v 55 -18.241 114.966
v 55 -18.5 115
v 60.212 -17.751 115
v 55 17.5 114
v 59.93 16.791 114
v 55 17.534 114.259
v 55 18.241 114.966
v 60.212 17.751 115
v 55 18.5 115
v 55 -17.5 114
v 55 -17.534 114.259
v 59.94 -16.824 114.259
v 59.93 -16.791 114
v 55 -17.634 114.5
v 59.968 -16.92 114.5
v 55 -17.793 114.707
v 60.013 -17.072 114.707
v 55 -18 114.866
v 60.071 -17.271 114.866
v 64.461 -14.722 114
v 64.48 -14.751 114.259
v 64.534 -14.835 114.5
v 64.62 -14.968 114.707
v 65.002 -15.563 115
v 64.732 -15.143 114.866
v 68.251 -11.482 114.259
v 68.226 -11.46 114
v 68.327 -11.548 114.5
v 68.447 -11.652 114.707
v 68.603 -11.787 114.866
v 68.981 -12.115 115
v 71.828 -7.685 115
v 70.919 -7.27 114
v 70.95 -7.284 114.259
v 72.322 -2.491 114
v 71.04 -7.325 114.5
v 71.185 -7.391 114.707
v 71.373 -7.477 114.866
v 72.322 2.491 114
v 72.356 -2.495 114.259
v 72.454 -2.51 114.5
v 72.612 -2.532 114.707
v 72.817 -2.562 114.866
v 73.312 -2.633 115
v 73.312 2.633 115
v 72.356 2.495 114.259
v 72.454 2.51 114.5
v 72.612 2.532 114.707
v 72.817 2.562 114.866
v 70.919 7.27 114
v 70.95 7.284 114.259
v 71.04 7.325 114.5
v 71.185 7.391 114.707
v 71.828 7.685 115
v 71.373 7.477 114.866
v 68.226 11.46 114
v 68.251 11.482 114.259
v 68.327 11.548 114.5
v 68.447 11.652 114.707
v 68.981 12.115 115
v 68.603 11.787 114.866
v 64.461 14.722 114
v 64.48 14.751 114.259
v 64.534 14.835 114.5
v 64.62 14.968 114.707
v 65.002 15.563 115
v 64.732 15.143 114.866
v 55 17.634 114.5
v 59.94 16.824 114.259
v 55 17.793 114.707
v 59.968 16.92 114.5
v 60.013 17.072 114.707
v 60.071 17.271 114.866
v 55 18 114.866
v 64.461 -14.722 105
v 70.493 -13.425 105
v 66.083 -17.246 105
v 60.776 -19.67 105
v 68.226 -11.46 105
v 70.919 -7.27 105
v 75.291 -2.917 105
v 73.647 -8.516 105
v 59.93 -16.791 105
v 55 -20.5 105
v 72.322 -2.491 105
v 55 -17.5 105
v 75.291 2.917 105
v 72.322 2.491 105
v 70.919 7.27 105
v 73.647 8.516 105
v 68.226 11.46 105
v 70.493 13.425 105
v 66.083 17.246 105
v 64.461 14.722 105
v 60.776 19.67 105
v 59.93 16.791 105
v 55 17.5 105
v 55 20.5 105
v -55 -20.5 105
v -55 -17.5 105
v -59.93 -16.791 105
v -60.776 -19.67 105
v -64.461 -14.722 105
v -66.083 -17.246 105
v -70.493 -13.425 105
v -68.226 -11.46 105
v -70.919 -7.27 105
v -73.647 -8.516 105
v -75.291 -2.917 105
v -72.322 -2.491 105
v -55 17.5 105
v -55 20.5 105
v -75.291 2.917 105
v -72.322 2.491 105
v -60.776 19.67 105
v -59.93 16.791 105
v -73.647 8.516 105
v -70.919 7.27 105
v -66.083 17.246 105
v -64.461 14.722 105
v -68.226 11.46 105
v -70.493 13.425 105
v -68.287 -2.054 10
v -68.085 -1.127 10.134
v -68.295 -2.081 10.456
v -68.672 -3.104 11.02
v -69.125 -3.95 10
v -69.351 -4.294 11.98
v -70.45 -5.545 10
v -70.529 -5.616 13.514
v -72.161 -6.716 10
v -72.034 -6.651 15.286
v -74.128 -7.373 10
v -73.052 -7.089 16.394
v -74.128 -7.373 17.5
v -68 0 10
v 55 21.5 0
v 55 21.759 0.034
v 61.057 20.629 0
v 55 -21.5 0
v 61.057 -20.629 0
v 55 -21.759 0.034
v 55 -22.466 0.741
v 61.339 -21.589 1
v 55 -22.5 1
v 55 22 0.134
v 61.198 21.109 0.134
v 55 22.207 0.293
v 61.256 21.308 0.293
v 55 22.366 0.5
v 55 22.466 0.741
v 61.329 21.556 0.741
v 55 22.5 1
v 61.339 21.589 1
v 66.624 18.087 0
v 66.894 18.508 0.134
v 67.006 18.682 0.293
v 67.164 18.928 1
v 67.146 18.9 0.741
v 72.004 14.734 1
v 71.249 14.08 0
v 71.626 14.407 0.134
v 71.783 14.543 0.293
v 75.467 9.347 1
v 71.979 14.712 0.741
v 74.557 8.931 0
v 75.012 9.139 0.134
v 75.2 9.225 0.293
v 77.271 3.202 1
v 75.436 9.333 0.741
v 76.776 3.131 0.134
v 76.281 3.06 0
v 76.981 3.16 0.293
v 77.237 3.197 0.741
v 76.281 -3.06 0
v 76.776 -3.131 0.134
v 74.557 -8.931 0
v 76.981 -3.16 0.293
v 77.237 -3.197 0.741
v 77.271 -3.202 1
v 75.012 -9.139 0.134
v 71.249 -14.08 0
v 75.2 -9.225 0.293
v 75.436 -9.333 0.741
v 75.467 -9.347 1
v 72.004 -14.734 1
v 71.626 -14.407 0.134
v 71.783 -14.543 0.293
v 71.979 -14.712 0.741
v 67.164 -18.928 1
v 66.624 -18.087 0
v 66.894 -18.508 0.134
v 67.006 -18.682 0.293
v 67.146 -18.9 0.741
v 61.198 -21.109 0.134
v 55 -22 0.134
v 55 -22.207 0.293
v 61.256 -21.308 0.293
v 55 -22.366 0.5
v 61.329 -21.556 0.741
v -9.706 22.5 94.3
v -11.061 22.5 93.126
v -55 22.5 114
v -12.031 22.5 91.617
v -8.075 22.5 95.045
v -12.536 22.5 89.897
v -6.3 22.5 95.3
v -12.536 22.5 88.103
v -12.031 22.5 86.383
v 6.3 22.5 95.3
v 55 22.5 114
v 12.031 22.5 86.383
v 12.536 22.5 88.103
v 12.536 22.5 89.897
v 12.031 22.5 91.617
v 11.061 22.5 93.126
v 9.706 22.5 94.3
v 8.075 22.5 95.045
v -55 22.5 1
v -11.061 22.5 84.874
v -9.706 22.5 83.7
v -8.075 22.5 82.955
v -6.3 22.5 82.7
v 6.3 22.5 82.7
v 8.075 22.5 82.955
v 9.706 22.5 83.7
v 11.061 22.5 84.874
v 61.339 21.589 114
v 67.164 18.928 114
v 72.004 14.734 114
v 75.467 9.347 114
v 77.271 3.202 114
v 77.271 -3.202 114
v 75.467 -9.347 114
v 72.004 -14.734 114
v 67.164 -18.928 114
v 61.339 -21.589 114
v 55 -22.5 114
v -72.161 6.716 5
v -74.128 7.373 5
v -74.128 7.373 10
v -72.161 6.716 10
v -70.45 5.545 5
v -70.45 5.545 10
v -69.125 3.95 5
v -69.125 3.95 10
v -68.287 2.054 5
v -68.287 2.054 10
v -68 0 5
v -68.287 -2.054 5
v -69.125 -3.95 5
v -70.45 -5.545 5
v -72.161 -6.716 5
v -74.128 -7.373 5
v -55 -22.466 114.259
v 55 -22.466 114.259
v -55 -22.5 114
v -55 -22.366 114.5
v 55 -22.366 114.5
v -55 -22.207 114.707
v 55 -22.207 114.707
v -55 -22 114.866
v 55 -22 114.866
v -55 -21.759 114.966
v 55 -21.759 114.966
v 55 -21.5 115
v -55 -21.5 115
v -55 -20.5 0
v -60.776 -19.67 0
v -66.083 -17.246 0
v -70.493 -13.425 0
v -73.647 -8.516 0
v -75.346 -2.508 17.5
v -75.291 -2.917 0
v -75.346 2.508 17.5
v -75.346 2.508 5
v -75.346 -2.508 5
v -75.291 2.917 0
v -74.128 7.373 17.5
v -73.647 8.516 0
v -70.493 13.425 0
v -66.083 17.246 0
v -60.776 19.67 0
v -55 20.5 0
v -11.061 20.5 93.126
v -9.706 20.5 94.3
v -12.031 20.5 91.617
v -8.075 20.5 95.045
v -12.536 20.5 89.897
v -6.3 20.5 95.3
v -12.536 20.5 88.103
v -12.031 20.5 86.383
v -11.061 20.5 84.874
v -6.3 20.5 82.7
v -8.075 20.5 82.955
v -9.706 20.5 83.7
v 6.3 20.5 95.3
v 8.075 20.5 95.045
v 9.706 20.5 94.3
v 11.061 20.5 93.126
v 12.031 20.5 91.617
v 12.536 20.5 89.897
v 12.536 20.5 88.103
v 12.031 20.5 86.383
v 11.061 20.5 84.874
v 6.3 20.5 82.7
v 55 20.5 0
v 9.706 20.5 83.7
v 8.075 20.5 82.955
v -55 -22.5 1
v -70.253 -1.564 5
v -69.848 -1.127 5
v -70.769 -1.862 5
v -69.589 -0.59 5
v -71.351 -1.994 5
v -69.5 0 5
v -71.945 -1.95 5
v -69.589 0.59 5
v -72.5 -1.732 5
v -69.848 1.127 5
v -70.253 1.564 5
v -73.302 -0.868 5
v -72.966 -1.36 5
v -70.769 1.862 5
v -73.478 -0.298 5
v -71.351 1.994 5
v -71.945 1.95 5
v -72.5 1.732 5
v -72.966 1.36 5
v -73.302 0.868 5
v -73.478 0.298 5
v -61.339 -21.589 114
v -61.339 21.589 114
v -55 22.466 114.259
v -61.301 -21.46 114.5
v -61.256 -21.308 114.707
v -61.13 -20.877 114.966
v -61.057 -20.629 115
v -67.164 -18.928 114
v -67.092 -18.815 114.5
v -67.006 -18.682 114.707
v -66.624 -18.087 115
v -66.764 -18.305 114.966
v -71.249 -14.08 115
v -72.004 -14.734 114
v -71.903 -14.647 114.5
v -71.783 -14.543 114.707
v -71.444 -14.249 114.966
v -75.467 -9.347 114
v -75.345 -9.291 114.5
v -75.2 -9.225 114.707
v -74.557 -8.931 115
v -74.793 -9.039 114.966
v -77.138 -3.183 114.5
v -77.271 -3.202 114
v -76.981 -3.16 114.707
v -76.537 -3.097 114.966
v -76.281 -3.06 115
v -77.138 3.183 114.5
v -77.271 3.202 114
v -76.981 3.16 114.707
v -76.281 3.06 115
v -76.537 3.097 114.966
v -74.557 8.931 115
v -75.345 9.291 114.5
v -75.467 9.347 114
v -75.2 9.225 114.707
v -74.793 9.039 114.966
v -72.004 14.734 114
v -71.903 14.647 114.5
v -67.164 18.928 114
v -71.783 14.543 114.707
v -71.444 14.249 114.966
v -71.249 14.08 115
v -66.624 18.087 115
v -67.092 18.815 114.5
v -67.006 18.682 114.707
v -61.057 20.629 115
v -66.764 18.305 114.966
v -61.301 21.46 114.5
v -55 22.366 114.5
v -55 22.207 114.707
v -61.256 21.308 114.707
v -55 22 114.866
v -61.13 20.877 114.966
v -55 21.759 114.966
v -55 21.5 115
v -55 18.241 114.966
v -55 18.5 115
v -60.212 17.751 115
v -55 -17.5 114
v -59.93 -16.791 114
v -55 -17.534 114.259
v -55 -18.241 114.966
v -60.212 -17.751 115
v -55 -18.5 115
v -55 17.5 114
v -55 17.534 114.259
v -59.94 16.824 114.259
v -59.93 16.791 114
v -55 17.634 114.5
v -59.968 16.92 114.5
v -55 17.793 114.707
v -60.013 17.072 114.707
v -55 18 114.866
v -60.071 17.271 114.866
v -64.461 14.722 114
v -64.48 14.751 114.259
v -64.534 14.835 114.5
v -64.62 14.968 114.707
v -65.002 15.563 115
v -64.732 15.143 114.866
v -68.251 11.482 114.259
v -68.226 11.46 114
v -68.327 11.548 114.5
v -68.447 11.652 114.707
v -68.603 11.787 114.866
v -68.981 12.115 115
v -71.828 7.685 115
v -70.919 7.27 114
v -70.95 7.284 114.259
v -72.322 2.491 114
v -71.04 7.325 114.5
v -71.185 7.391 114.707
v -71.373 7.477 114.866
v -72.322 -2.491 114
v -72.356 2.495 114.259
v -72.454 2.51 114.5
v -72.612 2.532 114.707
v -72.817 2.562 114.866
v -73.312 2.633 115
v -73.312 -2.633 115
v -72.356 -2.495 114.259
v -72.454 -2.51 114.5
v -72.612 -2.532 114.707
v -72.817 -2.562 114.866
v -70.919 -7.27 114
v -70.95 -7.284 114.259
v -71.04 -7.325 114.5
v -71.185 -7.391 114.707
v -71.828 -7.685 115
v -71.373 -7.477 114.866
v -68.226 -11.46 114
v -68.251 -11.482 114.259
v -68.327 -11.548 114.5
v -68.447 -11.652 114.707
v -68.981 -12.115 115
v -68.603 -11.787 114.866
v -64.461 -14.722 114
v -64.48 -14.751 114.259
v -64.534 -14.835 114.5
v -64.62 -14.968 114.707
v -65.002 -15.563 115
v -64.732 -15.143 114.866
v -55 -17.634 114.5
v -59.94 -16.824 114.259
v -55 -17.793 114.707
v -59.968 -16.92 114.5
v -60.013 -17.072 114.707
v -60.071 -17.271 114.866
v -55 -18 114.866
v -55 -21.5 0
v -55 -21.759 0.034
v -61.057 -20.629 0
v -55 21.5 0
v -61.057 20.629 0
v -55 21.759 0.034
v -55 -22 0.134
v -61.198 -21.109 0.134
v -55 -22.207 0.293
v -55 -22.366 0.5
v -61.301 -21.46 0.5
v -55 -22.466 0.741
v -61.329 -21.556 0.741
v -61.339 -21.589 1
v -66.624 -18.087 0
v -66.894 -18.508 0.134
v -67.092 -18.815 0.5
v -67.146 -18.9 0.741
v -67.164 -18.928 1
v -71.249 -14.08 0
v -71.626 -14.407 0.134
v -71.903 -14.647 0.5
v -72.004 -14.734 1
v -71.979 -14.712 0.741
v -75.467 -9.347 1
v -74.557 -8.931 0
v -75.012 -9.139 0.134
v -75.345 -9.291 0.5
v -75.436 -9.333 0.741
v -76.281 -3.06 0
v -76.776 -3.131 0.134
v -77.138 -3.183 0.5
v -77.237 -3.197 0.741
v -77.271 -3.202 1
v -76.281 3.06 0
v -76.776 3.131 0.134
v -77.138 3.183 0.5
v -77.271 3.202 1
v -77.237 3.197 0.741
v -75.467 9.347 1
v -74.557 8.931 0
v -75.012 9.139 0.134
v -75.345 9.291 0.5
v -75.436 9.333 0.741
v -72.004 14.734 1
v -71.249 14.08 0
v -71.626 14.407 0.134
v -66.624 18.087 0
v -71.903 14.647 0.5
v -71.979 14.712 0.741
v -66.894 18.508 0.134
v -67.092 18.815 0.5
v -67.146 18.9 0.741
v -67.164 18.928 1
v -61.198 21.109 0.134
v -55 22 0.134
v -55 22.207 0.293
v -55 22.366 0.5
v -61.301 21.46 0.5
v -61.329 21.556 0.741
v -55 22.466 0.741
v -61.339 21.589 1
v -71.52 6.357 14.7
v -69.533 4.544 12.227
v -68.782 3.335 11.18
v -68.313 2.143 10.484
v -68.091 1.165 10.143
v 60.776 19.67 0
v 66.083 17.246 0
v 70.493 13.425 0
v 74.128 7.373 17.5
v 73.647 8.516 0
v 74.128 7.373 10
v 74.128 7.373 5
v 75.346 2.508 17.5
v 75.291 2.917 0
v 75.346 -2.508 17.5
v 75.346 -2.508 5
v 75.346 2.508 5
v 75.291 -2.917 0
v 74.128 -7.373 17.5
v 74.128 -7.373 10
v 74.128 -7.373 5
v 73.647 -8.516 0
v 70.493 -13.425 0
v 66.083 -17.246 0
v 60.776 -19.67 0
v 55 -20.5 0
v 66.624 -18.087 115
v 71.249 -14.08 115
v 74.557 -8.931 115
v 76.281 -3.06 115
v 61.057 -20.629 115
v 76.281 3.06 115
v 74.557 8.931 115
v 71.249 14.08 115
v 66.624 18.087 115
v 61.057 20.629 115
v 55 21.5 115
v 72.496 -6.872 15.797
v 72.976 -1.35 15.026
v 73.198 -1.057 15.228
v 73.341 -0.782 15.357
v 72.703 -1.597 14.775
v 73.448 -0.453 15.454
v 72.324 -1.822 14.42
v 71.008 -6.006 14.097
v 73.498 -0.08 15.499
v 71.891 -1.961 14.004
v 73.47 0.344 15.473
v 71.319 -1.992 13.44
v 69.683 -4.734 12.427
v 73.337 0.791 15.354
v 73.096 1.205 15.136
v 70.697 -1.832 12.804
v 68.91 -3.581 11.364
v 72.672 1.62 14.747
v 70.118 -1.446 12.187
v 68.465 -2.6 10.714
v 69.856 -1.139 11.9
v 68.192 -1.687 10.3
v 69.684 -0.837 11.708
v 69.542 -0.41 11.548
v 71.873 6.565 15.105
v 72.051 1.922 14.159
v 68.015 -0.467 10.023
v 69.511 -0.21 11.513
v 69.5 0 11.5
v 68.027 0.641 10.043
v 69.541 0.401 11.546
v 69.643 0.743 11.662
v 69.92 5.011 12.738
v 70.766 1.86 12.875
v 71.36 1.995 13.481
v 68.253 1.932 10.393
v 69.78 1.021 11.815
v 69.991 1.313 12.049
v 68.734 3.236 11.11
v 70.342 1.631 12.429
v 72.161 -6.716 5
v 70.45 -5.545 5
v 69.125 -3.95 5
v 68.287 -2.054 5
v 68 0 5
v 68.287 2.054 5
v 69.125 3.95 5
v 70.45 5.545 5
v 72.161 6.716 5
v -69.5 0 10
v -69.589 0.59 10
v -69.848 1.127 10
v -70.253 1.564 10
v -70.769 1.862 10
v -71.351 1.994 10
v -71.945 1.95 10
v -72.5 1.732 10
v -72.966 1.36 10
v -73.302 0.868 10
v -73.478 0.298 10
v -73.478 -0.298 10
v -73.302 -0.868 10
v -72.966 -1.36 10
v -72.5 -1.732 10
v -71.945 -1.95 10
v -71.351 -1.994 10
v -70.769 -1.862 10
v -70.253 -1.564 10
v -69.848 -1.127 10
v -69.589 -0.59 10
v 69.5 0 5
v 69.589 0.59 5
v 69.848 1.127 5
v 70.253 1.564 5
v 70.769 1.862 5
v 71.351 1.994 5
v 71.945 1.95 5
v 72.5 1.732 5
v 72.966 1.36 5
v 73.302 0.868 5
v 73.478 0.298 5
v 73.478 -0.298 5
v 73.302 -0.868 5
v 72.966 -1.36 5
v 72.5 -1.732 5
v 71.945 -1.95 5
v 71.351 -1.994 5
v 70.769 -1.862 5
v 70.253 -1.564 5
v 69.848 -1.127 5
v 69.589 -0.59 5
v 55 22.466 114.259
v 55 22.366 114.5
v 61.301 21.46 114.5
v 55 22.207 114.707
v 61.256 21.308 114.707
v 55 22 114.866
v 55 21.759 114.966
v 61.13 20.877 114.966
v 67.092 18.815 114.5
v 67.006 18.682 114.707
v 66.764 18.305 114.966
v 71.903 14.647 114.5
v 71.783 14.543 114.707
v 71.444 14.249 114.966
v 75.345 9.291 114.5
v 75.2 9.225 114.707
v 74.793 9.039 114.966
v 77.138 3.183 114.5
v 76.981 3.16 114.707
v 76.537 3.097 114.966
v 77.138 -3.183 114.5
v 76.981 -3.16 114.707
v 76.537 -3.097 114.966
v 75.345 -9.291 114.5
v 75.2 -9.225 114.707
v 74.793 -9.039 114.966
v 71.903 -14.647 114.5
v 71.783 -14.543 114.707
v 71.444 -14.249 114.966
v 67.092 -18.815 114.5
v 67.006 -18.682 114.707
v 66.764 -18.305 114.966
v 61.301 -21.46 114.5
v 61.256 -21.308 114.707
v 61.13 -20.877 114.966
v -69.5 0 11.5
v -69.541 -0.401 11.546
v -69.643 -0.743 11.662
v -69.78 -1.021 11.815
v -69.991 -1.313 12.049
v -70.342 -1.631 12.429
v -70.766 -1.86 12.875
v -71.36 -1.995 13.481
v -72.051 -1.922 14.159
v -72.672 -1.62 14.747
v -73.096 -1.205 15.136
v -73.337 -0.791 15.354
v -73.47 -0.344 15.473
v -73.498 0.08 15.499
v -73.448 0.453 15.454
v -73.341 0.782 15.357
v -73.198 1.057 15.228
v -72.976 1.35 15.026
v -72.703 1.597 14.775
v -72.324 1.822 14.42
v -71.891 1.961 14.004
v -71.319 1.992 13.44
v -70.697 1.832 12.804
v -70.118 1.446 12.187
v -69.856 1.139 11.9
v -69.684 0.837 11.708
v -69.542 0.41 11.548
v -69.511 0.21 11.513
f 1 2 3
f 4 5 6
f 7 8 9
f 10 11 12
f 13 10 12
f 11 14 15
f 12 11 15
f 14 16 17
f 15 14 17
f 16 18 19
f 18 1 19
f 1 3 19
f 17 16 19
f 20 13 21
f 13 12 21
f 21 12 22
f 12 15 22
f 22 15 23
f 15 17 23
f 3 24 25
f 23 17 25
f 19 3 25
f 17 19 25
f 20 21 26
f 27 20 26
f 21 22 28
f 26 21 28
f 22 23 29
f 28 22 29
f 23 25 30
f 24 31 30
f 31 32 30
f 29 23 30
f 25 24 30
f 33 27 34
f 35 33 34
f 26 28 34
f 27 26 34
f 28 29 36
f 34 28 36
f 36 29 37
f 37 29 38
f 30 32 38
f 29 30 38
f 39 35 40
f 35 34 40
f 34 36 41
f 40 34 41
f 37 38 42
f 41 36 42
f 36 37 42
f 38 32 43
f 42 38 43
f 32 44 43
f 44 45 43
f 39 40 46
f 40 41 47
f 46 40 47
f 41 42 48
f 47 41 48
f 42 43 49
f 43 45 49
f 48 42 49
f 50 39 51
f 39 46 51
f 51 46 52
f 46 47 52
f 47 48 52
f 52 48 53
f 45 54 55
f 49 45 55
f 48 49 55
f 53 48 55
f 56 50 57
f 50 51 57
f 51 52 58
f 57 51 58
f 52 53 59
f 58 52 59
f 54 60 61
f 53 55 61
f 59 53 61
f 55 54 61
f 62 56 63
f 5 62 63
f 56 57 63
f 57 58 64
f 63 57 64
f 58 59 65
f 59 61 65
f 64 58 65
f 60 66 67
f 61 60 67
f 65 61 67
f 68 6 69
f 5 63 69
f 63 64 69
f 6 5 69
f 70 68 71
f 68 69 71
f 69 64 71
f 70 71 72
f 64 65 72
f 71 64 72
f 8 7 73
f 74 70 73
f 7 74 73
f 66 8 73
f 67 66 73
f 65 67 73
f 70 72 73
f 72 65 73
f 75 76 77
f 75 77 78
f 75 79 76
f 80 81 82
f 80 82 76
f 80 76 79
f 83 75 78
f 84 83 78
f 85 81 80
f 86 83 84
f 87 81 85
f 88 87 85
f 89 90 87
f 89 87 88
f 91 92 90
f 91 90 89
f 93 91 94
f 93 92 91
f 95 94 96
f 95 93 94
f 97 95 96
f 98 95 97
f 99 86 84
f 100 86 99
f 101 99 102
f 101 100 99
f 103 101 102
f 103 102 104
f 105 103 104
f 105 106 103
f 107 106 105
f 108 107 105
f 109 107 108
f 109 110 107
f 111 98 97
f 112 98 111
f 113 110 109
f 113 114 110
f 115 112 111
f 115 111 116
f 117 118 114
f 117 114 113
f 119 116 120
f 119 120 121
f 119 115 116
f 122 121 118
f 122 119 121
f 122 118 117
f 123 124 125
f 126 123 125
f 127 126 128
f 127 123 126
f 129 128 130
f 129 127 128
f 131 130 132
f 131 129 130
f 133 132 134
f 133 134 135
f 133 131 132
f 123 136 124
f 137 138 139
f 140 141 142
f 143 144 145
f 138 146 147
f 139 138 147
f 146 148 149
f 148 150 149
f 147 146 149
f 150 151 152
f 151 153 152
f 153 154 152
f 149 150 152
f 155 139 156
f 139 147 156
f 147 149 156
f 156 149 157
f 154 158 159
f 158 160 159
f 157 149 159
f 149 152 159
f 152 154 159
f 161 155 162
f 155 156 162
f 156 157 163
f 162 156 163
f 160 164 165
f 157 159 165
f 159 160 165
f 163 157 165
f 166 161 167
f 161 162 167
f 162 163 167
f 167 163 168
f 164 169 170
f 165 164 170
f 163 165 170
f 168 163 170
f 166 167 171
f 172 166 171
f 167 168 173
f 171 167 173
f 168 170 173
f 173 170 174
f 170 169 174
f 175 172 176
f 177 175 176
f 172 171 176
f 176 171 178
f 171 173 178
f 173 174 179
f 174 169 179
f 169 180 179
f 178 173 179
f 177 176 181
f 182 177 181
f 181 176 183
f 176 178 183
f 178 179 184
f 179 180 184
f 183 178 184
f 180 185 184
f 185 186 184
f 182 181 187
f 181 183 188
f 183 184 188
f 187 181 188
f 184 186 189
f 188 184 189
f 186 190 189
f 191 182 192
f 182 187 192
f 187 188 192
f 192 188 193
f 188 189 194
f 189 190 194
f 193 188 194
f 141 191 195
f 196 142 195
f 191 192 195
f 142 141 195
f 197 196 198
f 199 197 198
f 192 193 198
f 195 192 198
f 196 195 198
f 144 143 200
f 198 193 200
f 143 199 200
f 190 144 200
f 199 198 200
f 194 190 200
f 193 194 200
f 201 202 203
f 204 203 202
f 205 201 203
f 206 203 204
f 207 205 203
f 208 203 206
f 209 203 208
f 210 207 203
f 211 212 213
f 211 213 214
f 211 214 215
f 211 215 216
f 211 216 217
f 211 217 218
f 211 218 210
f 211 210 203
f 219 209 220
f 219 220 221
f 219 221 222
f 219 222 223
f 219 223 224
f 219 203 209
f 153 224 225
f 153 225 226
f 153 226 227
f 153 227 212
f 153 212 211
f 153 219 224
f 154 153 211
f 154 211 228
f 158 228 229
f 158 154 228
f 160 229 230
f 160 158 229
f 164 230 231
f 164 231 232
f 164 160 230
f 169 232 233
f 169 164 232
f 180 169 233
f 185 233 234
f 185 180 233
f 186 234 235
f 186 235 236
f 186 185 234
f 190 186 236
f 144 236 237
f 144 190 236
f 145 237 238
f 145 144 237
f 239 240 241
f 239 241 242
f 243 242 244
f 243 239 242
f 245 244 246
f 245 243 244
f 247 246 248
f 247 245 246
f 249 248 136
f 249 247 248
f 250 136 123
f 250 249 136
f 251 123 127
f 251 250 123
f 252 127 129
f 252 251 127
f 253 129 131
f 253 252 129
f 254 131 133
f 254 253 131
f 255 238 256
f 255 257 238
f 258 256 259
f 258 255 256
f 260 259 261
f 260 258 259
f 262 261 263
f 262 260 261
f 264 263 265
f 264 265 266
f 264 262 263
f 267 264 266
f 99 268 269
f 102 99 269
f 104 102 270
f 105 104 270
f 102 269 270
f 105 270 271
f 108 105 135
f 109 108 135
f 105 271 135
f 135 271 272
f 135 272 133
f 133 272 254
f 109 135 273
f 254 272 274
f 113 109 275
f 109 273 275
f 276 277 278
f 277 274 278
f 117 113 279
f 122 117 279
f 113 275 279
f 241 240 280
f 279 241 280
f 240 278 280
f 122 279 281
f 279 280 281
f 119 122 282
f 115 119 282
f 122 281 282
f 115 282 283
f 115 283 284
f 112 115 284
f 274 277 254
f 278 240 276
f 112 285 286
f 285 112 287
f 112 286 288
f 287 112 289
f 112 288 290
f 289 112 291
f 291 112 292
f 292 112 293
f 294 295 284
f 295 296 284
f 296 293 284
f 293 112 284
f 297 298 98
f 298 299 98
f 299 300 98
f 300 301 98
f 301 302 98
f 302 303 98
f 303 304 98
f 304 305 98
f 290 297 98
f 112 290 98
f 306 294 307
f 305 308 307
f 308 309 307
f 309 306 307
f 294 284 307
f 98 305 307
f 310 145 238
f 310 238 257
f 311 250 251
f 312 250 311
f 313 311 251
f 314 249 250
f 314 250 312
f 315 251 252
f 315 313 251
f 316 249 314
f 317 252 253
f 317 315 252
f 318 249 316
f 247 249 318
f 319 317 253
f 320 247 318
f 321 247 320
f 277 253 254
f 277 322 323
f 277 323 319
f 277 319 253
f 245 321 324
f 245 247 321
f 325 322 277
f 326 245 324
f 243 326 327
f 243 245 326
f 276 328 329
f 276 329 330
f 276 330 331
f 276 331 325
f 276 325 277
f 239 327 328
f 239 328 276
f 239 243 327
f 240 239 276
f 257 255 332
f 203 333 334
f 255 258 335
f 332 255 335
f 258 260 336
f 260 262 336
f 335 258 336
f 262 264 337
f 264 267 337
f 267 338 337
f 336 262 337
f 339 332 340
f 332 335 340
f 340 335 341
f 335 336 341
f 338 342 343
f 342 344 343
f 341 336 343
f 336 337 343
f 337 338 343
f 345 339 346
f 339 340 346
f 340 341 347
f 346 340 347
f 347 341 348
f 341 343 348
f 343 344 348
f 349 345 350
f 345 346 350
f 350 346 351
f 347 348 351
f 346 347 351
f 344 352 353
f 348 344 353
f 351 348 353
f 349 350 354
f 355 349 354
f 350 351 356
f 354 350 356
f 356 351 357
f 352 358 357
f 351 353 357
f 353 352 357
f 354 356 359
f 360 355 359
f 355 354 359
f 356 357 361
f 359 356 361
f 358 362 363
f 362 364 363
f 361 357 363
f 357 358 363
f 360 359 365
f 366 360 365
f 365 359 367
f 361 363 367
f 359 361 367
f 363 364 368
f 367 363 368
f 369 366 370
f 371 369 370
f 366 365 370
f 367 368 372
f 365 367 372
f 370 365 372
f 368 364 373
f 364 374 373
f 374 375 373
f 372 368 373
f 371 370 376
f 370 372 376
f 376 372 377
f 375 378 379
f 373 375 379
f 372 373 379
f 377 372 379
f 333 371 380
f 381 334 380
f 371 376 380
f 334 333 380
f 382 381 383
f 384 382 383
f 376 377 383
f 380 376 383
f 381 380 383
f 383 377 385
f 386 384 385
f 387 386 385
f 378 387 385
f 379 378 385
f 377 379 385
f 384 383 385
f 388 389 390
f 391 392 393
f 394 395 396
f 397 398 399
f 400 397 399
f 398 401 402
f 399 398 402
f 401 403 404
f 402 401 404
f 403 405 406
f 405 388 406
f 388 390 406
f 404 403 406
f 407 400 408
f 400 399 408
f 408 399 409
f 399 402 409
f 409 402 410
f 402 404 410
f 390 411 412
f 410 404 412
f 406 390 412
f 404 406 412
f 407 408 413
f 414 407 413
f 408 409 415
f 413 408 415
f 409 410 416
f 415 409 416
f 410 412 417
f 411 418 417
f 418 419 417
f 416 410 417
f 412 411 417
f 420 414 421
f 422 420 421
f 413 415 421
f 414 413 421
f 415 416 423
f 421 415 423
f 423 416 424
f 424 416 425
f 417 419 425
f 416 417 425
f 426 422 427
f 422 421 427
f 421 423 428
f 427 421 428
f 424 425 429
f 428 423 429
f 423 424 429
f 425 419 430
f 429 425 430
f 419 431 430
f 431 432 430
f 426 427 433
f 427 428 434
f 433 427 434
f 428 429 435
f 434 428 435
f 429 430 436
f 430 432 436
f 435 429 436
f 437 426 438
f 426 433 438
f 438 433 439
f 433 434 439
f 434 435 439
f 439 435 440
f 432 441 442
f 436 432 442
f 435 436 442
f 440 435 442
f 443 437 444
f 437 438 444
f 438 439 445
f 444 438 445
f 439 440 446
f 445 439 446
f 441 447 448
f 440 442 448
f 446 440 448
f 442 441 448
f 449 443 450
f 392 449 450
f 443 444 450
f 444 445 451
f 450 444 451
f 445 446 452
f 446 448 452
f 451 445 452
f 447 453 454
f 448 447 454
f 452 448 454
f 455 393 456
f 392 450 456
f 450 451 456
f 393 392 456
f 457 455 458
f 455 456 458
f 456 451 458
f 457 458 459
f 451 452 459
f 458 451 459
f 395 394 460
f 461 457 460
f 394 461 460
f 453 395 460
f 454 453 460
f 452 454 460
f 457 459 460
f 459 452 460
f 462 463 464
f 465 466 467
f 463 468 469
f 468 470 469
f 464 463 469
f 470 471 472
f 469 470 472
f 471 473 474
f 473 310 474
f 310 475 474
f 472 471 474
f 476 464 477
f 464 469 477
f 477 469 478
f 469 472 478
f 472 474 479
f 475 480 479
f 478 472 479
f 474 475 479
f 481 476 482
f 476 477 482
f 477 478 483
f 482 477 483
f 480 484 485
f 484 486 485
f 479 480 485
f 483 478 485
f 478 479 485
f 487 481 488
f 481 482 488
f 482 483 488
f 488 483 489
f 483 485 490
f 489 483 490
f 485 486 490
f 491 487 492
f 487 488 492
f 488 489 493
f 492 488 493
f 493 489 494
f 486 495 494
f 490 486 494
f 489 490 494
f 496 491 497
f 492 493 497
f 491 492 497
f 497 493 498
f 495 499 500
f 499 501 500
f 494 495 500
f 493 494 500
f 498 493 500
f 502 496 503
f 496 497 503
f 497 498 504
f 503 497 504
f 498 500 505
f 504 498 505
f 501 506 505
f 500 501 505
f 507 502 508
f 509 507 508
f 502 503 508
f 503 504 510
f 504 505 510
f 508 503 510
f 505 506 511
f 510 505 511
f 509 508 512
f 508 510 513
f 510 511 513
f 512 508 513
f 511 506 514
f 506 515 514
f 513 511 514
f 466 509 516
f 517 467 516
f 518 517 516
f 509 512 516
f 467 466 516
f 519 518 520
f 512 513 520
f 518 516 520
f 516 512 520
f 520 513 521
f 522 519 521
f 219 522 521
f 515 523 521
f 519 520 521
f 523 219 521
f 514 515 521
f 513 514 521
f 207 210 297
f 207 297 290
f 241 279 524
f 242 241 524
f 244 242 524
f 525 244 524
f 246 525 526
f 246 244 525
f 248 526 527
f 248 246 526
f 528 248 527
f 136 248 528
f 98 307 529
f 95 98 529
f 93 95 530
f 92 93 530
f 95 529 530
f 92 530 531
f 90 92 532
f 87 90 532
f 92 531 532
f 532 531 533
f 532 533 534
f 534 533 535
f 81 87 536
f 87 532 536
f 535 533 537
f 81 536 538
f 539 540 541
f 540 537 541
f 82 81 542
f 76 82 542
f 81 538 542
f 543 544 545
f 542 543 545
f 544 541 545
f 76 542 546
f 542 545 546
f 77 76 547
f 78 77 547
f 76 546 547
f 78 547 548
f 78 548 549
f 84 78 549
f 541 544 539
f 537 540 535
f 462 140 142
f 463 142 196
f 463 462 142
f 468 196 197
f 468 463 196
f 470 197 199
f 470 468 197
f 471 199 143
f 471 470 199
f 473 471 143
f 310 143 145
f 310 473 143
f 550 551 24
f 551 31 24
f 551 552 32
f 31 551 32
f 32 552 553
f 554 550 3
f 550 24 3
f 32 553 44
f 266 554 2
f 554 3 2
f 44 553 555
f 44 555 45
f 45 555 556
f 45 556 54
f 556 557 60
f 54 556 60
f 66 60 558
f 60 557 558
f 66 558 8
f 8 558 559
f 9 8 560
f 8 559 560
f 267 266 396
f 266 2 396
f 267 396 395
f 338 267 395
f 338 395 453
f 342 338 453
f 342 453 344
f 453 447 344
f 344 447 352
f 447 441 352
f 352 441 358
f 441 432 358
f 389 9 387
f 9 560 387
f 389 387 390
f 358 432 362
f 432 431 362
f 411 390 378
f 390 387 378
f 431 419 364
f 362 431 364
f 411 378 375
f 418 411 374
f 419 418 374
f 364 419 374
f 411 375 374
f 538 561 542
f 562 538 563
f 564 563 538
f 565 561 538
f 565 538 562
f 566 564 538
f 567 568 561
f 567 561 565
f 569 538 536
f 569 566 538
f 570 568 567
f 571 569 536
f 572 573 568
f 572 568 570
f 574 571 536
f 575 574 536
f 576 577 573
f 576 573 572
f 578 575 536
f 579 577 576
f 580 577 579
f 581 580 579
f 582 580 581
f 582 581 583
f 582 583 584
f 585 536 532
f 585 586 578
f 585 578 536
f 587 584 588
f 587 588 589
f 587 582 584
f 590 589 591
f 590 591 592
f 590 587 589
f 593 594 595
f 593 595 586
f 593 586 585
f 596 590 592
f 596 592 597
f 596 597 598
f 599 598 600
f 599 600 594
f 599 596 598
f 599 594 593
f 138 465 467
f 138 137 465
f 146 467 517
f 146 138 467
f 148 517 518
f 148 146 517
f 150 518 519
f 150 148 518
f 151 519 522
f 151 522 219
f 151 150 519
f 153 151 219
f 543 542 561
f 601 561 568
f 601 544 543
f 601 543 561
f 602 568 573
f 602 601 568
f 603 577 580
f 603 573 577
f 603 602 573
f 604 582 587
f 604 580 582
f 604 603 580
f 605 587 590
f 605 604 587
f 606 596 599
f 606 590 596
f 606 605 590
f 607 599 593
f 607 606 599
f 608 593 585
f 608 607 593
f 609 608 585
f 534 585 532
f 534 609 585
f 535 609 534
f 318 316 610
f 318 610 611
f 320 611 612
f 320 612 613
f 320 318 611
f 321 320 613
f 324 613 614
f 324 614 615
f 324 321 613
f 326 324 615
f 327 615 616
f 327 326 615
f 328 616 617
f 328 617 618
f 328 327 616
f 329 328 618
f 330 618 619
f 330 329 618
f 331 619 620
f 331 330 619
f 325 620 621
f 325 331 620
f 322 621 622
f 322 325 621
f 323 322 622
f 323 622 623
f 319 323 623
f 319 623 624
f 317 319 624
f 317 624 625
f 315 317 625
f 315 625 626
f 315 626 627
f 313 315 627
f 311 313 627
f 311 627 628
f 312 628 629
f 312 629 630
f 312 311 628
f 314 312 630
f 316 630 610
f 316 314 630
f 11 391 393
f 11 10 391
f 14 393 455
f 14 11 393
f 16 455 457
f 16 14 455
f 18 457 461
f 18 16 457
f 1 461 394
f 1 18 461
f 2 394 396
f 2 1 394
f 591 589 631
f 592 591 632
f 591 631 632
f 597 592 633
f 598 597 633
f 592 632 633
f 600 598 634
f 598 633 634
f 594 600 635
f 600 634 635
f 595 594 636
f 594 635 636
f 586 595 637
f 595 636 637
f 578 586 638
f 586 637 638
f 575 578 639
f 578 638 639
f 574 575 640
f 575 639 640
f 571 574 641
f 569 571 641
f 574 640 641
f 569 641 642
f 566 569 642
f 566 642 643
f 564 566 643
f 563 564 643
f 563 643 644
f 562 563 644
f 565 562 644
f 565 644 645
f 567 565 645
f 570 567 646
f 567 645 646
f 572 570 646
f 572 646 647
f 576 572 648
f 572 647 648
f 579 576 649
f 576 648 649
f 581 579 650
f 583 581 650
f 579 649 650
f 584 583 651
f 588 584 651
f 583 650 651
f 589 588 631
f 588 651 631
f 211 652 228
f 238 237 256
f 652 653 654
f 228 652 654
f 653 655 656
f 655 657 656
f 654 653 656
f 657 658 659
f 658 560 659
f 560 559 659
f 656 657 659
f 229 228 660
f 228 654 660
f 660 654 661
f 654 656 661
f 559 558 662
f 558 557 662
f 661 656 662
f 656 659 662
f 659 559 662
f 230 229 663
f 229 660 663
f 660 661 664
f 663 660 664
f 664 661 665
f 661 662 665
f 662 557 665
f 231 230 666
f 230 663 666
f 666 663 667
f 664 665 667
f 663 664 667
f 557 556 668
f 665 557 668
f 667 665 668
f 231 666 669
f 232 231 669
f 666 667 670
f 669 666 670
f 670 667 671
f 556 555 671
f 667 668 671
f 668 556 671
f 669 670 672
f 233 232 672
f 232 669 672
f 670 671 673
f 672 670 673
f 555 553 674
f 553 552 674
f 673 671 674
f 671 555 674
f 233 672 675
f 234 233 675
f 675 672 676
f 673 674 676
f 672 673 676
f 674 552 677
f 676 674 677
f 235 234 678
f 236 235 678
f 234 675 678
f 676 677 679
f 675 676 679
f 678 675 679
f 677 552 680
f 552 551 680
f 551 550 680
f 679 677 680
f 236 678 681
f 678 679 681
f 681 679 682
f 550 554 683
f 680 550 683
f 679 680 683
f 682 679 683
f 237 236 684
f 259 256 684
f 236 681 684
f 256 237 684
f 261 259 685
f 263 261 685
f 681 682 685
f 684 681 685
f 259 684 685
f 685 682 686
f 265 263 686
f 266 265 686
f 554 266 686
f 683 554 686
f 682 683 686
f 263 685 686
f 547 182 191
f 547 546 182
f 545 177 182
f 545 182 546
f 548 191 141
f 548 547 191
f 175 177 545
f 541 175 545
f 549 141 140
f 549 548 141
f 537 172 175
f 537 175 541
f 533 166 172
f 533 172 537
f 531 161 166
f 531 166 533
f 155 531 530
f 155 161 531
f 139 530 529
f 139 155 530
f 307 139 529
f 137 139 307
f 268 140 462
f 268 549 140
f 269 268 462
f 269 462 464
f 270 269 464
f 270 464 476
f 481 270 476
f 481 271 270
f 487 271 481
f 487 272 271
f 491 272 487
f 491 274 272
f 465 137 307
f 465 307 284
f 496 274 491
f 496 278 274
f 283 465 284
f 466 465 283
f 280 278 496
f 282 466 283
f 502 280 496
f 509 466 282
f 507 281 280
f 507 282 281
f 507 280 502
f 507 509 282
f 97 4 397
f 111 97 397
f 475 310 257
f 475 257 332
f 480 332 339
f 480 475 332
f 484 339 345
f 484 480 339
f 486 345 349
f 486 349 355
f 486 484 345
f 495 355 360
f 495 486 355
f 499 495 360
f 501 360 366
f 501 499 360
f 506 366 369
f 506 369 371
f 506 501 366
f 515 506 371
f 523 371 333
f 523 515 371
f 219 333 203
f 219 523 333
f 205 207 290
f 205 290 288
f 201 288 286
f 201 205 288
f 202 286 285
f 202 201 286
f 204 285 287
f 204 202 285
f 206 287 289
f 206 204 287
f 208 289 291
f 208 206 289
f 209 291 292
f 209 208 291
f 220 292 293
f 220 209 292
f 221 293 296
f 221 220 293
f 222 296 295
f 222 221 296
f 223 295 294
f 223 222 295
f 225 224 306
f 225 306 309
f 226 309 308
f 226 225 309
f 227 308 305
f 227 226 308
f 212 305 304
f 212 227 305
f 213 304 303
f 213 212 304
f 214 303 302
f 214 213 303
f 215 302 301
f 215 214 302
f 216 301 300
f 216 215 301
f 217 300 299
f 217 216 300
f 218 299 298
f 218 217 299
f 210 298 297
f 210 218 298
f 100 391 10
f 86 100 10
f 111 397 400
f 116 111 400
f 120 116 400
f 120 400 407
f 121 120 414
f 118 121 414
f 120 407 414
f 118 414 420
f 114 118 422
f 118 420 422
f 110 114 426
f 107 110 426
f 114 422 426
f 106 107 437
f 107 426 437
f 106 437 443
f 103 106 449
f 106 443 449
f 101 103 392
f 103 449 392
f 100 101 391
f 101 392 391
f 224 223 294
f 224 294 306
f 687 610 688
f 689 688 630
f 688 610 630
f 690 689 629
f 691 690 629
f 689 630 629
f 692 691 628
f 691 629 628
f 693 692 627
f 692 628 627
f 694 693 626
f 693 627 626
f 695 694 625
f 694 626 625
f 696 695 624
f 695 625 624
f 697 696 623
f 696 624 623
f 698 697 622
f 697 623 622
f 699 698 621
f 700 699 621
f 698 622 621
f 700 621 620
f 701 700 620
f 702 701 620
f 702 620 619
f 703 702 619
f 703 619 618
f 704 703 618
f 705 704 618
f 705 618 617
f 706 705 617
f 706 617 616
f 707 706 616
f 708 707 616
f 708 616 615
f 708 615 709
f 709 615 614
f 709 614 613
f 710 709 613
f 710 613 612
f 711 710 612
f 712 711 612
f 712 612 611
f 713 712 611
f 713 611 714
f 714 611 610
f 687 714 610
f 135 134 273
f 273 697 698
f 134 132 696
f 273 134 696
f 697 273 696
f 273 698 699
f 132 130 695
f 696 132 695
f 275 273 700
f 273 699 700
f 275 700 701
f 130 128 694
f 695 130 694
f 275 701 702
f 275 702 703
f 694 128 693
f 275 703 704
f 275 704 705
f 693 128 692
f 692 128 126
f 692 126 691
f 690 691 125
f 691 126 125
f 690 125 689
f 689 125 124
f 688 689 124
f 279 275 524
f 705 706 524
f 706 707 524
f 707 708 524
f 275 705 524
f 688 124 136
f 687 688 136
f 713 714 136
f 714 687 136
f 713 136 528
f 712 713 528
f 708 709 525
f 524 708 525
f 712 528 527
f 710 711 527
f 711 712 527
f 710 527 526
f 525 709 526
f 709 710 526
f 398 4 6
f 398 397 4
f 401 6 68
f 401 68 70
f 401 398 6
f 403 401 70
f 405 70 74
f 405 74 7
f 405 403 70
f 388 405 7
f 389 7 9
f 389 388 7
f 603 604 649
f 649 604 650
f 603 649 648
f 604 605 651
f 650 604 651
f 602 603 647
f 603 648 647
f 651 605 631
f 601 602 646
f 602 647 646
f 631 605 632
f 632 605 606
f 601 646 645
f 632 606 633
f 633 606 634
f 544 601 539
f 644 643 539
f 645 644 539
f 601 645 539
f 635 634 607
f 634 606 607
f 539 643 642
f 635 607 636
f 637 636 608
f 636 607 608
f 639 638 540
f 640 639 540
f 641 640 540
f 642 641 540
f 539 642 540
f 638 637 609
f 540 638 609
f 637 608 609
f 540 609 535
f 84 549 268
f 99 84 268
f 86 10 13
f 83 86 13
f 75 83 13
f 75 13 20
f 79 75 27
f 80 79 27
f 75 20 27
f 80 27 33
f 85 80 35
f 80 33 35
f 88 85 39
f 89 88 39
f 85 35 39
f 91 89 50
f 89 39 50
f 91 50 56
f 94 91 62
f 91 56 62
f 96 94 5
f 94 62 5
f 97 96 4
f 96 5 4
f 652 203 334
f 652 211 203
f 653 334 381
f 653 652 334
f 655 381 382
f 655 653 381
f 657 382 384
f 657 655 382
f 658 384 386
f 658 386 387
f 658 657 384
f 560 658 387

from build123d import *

# Parameters (mm, degrees)
BOSS_EXTRU_1_DEPTH      = 115
ENL_V_MAT_EXTRU_1_DEPTH = 10
ENL_V_MAT_EXTRU_2_DEPTH = 105
ESQUISSE4_R             = 2
BOSS_EXTRU_2_DEPTH      = 5
CHANFREIN1_SIZE         = 7.5
ENL_V_MAT_EXTRU_3_REACH = 147.795
CONG_1_R                = 1


with BuildPart() as part:
    # Esquisse1 → Boss.-Extru.1 (new body)
    with BuildSketch(Plane.XY):
        with BuildLine():
            Line((-55, 22.5), (55, 22.5))
            ThreePointArc((55, 22.5), (77.5, 0), (55, -22.5))
            Line((55, -22.5), (-55, -22.5))
            ThreePointArc((-55, -22.5), (-77.5, 0), (-55, 22.5))
        make_face()
    extrude(amount=BOSS_EXTRU_1_DEPTH)

    # Esquisse2 → Enlèv. mat.-Extru.1 (cut)
    with BuildSketch(Plane.XY.offset(115)):
        with BuildLine():
            Line((-55, -17.5), (55, -17.5))
            ThreePointArc((55, -17.5), (72.5, 0), (55, 17.5))
            Line((55, 17.5), (-55, 17.5))
            ThreePointArc((-55, 17.5), (-72.5, 0), (-55, -17.5))
        make_face()
    extrude(amount=-ENL_V_MAT_EXTRU_1_DEPTH, mode=Mode.SUBTRACT)

    # Esquisse3 → Enlèv. mat.-Extru.2 (cut)
    with BuildSketch(Plane(origin=(0, 0, 0), x_dir=(-1, 0, 0), z_dir=(0, 0, -1))):
        with BuildLine():
            Line((55, 20.5), (-55, 20.5))
            ThreePointArc((-55, 20.5), (-75.5, 0), (-55, -20.5))
            Line((-55, -20.5), (55, -20.5))
            ThreePointArc((55, -20.5), (75.5, 0), (55, 20.5))
        make_face()
    extrude(amount=-ENL_V_MAT_EXTRU_2_DEPTH, mode=Mode.SUBTRACT)

    # Esquisse4 → Boss.-Extru.2 (add)
    with BuildSketch(Plane(origin=(0, 0, 5), x_dir=(-1, 0, 0), z_dir=(0, 0, -1))):
        with BuildLine():
            ThreePointArc((-74.12804878, 7.373448979), (-68, 0), (-74.12804878, -7.373448979))
            ThreePointArc((-74.12804878, -7.373448979), (-75.5, 0), (-74.12804878, 7.373448979))
        make_face()
        with Locations((-71.5, 0)):
            Circle(ESQUISSE4_R, mode=Mode.SUBTRACT)
    boss_extru_2 = extrude(amount=-BOSS_EXTRU_2_DEPTH)

    # Symétrie1: Boss.-Extru.2 across plane
    add(boss_extru_2.mirror(Plane(origin=(0, 0, 0), x_dir=(0, 0, 1), z_dir=(1, 0, 0))))

    # Chanfrein1
    # the kernel refuses this chamfer: 7.5 mm, written as the material it adds along each edge
    with BuildSketch(Plane(origin=(55, 0, 10), x_dir=(0.25894364440862044, -0.9658924313920169, 0), z_dir=(-0.9658924313920169, -0.25894364440862044, 0))) as chanfrein1_piece_1_section:
        Polygon((20.5, CHANFREIN1_SIZE), (20.5 - CHANFREIN1_SIZE, 0), (20.5, 0), align=None)
    chanfrein1_piece_1 = revolve(axis=Axis((55, 0, 10), (0, 0, 1)), revolution_arc=149.985218041, mode=Mode.PRIVATE)
    chanfrein1_piece_1 = chanfrein1_piece_1 & Plane(origin=(75.5, 0, 16.376958041), x_dir=(-0.1829268292682967, 0.9831265305818206, 0), z_dir=(0, 0, -1)) * Cylinder(7.5, 83, mode=Mode.PRIVATE)
    chanfrein1_piece_1 = chanfrein1_piece_1 - Plane(origin=(71.5, 0, 16.376958041), x_dir=(-1, 0, 0), z_dir=(0, 0, -1)) * Cylinder(2, 83, mode=Mode.PRIVATE)
    add(chanfrein1_piece_1)
    with BuildSketch(Plane(origin=(-55, 0, 10), x_dir=(-0.2589436444086207, -0.9658924313920167, 0), z_dir=(0.9658924313920167, -0.2589436444086207, 0))) as chanfrein1_piece_2_section:
        Polygon((20.5, -CHANFREIN1_SIZE), (20.5 - CHANFREIN1_SIZE, 0), (20.5, 0), align=None)
    chanfrein1_piece_2 = revolve(axis=Axis((-55, 0, 10), (0, 0, -1)), revolution_arc=149.985218041, mode=Mode.PRIVATE)
    chanfrein1_piece_2 = chanfrein1_piece_2 & Plane(origin=(-75.5, 0, 16.376958041), x_dir=(0.1829268292682967, 0.9831265305818206, 0), z_dir=(0, 0, -1)) * Cylinder(7.5, 83, mode=Mode.PRIVATE)
    chanfrein1_piece_2 = chanfrein1_piece_2 - Plane(origin=(-71.5, 0, 16.376958041), x_dir=(1, 0, 0), z_dir=(0, 0, -1)) * Cylinder(2, 83, mode=Mode.PRIVATE)
    add(chanfrein1_piece_2)

    # Esquisse5 → Enlèv. mat.-Extru.3 (cut, up to next)
    with BuildSketch(Plane(origin=(0, 22.5, 0), x_dir=(1, 0, 0), z_dir=(0, 1, 0)), mode=Mode.PRIVATE) as enl_v_mat_extru_3_sk1:
        with BuildLine():
            Line((-6.3, -82.7), (6.3, -82.7))
            ThreePointArc((6.3, -82.7), (12.6, -89), (6.3, -95.3))
            Line((6.3, -95.3), (-6.3, -95.3))
            ThreePointArc((-6.3, -95.3), (-12.6, -89), (-6.3, -82.7))
        make_face()
    enl_v_mat_extru_3_tool1 = extrude(enl_v_mat_extru_3_sk1.sketch, amount=-ENL_V_MAT_EXTRU_3_REACH, mode=Mode.PRIVATE) & part.part
    add(enl_v_mat_extru_3_tool1.solids().sort_by_distance((0, 22.5, 89))[0], mode=Mode.SUBTRACT)

    # Congé1
    cong_1_edges = [part.edges().sort_by_distance(p)[0] for p in [
        (77.5, 0, 115),
        (0, 22.5, 115),
        (-72.5, 0, 115),
        (0, -17.5, 115),
        (72.5, 0, 115),
        (0, 17.5, 115),
        (-77.5, 0, 115),
        (0, 22.5, 0),
        (77.5, 0, 0),
        (0, -22.5, 0),
        (-77.5, 0, 0),
        (0, -22.5, 115),
    ]]
    fillet(cong_1_edges, radius=CONG_1_R)


solid = part.part
